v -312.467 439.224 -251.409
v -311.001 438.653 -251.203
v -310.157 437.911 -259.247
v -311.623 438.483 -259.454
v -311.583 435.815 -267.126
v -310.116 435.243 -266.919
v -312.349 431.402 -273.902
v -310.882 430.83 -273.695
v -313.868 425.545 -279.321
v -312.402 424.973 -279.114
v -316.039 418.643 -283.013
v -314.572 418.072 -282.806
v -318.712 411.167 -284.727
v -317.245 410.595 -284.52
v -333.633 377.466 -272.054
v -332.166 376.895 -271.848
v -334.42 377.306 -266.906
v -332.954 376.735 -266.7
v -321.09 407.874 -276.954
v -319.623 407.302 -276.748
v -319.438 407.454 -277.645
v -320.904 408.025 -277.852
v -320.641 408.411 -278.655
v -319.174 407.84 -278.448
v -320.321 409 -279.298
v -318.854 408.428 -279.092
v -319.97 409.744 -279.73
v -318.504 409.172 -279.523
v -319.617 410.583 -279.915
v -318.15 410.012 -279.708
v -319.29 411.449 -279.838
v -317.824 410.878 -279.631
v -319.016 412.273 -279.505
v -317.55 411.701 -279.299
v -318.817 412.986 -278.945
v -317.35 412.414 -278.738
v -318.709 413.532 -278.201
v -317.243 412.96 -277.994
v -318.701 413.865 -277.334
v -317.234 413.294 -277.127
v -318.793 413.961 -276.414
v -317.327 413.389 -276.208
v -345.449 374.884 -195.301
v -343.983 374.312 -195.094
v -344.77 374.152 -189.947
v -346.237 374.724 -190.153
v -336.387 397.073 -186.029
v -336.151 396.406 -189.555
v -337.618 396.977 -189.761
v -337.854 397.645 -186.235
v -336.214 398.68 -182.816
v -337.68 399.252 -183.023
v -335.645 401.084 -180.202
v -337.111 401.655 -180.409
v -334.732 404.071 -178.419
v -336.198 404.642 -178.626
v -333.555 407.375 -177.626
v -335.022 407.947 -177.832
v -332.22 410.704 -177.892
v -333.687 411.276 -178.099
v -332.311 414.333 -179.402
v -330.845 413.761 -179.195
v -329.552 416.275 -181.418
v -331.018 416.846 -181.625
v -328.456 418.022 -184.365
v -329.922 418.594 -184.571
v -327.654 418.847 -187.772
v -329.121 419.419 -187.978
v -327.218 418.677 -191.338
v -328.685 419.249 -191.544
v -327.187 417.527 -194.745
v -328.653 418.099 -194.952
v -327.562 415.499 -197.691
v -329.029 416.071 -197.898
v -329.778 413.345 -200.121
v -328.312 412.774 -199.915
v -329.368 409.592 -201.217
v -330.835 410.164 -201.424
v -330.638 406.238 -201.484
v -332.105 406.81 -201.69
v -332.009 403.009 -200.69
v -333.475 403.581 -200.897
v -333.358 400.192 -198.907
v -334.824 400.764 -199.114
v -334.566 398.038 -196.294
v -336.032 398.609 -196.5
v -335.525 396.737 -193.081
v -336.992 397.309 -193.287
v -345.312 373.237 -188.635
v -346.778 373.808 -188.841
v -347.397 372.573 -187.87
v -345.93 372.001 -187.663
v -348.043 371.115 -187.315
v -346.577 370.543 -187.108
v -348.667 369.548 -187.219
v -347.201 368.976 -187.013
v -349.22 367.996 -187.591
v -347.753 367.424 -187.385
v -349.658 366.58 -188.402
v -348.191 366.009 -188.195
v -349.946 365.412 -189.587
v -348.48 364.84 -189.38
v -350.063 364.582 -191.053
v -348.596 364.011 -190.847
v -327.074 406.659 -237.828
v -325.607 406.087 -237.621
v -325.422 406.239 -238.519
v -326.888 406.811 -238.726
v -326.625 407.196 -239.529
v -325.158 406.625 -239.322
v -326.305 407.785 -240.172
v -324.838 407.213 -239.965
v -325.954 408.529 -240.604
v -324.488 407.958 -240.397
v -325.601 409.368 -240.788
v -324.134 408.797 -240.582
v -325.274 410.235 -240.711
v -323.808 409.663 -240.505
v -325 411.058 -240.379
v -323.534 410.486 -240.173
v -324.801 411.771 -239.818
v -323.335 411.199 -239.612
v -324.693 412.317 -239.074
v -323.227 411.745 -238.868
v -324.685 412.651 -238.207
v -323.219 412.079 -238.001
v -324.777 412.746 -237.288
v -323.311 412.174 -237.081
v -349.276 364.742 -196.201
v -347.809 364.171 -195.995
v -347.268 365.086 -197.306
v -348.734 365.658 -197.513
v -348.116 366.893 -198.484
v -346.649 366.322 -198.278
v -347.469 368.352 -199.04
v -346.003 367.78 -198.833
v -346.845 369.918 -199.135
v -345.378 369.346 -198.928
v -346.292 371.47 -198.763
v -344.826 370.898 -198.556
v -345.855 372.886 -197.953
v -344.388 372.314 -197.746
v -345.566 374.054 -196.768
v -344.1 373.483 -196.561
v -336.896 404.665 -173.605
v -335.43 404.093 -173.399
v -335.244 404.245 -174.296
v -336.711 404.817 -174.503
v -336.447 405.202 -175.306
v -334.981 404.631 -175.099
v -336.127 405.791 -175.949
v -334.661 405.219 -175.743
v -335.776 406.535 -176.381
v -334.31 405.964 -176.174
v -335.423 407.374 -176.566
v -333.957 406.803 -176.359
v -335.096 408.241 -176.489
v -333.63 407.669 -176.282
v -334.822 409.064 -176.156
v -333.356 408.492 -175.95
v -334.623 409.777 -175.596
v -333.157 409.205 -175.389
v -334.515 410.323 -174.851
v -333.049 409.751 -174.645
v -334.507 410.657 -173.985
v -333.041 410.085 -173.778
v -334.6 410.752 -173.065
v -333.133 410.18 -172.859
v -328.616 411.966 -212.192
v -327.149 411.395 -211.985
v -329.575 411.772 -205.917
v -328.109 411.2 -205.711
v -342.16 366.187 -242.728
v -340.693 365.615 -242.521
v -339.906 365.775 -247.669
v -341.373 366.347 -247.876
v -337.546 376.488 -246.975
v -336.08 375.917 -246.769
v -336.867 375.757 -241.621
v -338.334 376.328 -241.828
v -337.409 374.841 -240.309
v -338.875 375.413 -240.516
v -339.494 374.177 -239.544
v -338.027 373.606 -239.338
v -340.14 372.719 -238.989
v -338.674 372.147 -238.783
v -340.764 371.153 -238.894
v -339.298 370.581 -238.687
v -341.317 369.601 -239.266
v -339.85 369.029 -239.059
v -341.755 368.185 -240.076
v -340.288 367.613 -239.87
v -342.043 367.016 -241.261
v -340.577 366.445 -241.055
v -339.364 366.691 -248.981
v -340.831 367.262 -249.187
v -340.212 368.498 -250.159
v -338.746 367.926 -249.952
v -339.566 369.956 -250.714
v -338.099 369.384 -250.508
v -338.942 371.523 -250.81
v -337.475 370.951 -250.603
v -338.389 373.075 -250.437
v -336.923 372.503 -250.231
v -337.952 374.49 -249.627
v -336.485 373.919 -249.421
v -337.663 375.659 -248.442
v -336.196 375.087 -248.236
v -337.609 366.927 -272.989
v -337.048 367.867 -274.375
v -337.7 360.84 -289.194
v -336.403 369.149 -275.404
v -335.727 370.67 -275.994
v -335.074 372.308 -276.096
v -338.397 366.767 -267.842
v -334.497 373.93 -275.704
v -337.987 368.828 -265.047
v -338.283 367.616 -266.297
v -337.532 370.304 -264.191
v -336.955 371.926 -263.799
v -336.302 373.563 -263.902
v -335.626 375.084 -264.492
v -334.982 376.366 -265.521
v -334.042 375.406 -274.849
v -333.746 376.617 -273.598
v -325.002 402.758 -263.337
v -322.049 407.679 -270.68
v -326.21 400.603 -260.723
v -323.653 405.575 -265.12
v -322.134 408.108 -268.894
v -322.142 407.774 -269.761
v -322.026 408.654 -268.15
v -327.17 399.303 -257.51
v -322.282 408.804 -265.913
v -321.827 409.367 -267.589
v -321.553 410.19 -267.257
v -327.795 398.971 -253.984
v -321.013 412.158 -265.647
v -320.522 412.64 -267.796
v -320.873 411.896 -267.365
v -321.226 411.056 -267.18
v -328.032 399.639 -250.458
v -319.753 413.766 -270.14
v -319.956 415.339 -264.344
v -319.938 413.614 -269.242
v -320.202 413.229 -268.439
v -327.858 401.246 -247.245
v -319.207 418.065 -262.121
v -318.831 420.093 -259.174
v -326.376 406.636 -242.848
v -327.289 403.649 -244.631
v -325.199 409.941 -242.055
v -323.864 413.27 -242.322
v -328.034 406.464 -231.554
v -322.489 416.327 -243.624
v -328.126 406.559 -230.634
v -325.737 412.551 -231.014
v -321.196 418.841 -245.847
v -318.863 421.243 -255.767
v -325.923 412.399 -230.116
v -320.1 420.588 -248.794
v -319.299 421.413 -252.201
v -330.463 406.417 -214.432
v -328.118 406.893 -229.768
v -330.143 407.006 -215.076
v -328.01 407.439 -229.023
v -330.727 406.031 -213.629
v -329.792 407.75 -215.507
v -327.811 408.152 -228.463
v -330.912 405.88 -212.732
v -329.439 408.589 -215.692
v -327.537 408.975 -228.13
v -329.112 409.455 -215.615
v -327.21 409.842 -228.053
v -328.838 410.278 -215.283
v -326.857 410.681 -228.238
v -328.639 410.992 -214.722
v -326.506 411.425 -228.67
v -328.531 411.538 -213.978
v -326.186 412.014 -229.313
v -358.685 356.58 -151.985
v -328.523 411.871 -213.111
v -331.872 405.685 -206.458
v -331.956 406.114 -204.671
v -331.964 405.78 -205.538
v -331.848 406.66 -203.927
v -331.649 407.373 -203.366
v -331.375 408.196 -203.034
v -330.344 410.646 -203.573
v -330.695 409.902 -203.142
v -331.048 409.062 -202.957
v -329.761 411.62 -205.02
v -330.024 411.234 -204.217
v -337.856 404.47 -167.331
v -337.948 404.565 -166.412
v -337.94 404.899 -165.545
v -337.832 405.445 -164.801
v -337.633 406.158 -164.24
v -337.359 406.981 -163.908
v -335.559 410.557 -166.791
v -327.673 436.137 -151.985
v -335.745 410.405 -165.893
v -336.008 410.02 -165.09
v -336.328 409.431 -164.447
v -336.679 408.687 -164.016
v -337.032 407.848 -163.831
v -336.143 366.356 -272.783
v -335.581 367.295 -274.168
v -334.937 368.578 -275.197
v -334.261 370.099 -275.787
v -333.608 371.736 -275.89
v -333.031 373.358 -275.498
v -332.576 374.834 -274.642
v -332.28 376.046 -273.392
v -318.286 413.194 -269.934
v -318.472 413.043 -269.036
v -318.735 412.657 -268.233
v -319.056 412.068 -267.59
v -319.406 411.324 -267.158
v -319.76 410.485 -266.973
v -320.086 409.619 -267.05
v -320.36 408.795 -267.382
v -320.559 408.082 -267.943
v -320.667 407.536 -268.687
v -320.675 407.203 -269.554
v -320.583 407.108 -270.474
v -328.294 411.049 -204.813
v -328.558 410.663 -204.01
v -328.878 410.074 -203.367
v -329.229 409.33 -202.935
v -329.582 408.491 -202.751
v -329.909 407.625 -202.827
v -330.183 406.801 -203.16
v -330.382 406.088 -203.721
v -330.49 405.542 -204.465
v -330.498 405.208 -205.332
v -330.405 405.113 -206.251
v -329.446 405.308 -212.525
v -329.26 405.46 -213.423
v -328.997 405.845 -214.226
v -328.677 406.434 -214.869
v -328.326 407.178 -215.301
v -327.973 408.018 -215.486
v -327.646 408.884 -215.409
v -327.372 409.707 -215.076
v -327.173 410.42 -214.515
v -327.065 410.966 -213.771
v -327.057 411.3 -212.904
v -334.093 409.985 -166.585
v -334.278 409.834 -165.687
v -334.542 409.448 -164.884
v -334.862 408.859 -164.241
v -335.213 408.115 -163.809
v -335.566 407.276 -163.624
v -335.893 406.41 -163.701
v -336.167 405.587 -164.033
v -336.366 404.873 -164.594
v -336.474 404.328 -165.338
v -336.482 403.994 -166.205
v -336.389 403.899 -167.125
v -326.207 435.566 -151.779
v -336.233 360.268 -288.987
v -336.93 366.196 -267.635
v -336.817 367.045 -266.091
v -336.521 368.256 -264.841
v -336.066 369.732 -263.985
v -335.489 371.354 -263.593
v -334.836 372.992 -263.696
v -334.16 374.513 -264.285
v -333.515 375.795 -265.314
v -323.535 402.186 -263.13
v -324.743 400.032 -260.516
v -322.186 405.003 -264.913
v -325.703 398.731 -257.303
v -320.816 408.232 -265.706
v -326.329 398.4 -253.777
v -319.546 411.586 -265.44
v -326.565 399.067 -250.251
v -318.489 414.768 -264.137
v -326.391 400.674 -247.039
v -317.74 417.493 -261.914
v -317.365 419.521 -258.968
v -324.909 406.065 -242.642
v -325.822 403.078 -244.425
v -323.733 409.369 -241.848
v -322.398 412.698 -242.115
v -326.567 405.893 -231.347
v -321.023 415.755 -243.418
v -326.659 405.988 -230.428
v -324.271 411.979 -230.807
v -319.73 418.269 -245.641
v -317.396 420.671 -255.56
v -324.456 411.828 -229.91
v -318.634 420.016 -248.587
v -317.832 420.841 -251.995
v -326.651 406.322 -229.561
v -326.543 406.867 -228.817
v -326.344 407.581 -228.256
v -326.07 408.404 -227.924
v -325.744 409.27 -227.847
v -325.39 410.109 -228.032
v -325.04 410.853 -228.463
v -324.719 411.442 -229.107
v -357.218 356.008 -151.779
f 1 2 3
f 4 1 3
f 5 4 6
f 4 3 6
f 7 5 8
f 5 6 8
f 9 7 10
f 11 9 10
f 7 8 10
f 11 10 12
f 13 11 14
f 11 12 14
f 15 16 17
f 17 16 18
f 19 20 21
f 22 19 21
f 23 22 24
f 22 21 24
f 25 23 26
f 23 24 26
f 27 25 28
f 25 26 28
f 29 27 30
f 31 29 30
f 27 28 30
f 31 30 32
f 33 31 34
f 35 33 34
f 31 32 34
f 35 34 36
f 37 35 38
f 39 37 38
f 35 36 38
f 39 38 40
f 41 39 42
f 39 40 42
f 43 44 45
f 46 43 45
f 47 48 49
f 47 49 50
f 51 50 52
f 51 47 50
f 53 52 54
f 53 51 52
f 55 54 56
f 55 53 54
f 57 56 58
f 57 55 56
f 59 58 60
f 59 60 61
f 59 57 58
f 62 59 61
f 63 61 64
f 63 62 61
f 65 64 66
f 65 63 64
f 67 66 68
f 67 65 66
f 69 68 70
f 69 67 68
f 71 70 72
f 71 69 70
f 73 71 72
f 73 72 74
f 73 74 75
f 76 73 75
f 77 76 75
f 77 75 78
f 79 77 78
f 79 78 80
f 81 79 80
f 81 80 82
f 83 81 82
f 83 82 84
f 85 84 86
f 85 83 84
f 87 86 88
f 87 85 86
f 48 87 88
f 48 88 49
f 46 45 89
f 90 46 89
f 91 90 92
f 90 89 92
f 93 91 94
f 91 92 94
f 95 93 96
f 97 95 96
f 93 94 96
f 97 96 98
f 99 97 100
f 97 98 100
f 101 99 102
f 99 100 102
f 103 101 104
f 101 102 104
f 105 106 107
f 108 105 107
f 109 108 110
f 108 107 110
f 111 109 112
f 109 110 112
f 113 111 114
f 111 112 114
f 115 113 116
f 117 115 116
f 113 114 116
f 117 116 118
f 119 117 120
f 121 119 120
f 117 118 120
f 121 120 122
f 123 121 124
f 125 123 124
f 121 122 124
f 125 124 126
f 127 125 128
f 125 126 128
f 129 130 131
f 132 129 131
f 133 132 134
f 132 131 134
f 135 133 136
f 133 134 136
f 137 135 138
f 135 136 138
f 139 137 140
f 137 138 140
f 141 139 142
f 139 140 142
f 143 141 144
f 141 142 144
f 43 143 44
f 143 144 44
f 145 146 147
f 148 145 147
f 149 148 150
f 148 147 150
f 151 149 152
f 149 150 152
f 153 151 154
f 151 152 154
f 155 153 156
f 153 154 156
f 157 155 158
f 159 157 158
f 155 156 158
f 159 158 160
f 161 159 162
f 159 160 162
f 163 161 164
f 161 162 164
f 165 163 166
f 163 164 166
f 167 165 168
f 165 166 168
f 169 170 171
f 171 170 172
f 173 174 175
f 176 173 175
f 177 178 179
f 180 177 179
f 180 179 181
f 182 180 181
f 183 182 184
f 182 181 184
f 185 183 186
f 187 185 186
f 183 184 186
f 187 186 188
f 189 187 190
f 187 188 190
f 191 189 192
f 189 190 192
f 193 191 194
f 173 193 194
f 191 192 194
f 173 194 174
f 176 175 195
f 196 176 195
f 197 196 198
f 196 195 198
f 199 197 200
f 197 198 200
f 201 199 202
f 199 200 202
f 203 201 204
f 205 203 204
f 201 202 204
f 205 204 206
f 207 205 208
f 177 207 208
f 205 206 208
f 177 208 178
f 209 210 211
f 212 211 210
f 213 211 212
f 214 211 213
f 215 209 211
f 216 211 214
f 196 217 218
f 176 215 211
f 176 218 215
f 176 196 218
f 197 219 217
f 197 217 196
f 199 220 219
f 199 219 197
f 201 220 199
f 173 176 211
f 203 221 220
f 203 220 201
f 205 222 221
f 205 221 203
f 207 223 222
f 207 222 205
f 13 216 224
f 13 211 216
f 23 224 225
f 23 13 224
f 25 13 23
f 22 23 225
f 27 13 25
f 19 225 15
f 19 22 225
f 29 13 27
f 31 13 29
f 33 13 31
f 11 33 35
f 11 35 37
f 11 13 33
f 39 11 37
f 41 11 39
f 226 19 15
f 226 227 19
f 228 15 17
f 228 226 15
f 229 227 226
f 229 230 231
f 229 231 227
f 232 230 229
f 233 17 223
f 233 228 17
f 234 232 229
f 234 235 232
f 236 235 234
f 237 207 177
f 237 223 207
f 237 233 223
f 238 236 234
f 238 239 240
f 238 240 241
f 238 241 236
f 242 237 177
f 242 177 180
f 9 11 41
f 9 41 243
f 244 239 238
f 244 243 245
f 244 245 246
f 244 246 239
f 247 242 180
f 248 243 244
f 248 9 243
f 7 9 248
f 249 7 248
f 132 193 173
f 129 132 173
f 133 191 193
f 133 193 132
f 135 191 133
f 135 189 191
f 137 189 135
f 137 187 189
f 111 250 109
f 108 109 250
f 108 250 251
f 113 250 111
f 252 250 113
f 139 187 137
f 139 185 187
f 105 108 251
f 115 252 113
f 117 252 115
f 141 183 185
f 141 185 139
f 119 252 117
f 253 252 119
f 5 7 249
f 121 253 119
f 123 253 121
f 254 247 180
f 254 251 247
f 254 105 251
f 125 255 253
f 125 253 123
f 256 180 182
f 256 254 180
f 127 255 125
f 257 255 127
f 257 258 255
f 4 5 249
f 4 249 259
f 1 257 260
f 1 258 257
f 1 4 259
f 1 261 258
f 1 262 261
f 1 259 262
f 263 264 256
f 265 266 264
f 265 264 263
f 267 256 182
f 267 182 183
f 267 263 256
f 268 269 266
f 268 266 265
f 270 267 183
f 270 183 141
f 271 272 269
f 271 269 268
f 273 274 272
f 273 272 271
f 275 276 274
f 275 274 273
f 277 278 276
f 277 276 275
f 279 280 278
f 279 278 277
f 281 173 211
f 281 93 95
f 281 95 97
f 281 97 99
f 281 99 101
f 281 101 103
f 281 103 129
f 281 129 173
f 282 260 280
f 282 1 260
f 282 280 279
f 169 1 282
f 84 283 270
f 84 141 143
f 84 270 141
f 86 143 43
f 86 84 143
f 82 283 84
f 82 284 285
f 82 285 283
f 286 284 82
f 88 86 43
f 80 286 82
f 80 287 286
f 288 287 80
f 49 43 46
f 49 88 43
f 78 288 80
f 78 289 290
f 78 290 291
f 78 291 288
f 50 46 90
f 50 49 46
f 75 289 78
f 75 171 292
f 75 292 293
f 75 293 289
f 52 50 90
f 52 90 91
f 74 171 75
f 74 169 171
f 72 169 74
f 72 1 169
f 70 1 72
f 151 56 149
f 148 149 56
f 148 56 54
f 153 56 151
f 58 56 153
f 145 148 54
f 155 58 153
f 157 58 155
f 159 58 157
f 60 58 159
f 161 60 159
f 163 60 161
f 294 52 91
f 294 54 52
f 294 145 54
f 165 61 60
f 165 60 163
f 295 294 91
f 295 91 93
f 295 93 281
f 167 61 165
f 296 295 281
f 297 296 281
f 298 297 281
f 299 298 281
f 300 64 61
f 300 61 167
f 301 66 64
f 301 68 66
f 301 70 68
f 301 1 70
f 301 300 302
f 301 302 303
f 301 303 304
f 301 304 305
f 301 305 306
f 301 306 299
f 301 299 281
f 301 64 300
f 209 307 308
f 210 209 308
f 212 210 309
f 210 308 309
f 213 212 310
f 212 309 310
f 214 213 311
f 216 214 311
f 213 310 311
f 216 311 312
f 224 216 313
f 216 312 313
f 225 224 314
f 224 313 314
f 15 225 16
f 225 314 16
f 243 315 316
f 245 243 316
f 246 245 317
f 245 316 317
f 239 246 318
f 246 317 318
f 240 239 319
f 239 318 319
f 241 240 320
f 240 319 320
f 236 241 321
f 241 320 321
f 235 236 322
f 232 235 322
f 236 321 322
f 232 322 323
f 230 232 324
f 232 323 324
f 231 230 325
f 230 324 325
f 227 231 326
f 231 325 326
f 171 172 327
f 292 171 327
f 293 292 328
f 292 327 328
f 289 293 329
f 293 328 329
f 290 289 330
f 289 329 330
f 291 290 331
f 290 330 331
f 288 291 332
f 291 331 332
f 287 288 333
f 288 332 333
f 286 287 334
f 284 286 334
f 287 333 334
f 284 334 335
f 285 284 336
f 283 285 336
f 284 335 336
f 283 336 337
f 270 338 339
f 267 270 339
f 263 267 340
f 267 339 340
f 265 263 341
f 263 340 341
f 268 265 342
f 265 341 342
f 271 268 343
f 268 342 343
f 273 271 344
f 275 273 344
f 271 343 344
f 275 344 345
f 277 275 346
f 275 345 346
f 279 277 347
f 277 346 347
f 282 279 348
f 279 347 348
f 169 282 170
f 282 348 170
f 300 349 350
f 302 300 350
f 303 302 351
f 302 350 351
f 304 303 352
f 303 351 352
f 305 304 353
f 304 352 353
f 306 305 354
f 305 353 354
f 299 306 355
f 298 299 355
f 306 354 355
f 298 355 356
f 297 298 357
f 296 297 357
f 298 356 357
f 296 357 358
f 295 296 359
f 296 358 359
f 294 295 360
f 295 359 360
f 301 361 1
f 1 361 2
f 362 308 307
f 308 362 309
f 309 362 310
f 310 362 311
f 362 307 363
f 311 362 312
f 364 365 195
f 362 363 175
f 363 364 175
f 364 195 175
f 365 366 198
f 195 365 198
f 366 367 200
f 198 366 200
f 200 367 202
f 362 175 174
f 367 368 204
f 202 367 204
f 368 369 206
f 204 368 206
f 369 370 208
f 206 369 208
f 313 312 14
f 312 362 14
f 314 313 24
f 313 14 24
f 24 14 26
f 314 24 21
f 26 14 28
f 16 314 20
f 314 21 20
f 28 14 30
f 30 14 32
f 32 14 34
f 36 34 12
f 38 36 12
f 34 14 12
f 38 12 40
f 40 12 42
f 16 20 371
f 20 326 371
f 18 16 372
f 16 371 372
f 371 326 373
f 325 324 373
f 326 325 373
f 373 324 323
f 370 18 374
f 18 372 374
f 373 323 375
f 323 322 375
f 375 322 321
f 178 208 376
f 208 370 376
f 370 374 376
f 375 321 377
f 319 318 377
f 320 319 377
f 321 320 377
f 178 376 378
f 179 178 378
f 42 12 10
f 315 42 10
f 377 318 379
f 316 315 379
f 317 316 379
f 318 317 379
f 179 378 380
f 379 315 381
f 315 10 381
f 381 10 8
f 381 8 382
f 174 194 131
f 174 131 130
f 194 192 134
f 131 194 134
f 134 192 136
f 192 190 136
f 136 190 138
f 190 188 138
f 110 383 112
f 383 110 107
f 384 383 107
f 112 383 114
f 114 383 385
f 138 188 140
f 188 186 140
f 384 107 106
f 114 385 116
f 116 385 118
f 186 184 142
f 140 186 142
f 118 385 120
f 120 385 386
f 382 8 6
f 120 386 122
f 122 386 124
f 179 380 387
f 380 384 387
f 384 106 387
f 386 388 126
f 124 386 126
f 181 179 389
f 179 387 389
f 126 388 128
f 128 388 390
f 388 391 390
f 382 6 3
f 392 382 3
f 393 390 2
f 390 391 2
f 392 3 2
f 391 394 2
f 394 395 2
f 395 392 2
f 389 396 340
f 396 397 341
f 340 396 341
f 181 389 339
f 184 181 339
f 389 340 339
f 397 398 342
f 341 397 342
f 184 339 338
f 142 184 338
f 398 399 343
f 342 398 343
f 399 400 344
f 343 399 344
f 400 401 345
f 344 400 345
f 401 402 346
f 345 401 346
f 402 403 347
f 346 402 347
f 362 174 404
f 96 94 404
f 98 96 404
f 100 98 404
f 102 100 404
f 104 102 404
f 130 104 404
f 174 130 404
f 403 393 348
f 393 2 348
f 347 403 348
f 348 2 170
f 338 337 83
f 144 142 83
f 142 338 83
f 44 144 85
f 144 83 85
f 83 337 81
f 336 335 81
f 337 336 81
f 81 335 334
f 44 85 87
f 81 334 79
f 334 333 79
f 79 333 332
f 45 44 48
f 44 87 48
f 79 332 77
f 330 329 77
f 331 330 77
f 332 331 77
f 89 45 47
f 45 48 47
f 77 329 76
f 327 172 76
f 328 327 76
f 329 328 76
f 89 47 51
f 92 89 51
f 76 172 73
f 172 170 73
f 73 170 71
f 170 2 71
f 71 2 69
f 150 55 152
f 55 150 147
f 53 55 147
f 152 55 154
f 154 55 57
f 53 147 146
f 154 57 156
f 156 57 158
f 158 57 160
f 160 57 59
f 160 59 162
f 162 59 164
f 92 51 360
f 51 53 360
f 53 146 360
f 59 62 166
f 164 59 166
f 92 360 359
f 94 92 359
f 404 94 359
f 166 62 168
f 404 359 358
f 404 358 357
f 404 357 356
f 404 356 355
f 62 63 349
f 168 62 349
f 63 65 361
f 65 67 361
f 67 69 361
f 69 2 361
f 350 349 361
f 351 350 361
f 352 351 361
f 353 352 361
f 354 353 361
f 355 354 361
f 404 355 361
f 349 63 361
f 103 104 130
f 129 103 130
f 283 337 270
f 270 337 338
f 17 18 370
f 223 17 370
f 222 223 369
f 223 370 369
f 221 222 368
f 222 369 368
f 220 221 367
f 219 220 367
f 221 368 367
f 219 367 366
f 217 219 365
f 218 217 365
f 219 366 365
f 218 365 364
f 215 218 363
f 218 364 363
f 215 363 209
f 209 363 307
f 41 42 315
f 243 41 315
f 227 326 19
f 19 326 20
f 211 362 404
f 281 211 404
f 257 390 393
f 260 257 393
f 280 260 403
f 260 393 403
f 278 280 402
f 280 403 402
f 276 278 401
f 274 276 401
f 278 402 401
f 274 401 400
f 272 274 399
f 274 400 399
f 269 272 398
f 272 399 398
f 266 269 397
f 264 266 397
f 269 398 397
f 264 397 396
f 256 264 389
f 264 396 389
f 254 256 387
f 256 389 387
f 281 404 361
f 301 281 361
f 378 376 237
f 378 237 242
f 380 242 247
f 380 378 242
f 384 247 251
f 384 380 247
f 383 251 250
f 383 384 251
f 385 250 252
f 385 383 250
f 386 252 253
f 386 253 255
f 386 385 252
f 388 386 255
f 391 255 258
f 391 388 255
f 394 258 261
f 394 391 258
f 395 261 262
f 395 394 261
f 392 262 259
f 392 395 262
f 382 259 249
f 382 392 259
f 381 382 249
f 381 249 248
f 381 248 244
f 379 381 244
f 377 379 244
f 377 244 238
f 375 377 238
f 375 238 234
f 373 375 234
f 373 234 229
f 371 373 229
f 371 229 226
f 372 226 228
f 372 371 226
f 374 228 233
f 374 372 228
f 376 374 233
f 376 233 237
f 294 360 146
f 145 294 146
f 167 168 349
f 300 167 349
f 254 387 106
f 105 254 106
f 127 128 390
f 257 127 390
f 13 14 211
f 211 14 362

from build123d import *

# Parameters (mm, degrees)
SKETCH39_R          = 12.065
BOSS_EXTRUDE1_DEPTH = 1.5875


with BuildPart() as part:
    # Sketch39 → Boss-Extrude1 (new body)
    with BuildSketch(Plane(origin=(-441.521969452, 172.104793819, -62.182961286), x_dir=(-0.1212218165913434, 0.04725213510134498, 0.9915001295565519), z_dir=(-0.9237984742451071, 0.36009566214142513, -0.1301056996804562))):
        with BuildLine():
            Line((-228.748442373, 213.554448141), (-90.363815922, 201.963804234))
            Line((-90.363815922, 201.963804234), (-90.363815922, 287.351743879))
            Line((-90.363815922, 287.351743879), (-190.640017459, 295.750550698))
            ThreePointArc((-190.640017459, 295.750550698), (-213.325518758, 288.505331466), (-224.243446911, 267.341116014))
            Line((-224.243446911, 267.341116014), (-228.748442373, 213.554448141))
        make_face()
        with Locations((-128.463815922, 259.318927244)):
            Circle(SKETCH39_R, mode=Mode.SUBTRACT)
        with Locations((-193.237014843, 264.74411863)):
            Circle(SKETCH39_R, mode=Mode.SUBTRACT)
        with BuildLine():
            Line((-211.461957069, 230.522345777), (-206.270039744, 230.087487755))
            ThreePointArc((-206.270039744, 230.087487755), (-203.136411518, 224.15373677), (-207.213438794, 218.823926718))
            Line((-207.213438794, 218.823926718), (-212.405356118, 219.25878474))
            ThreePointArc((-212.405356118, 219.25878474), (-215.538984345, 225.192535724), (-211.461957069, 230.522345777))
        make_face(mode=Mode.SUBTRACT)
        with BuildLine():
            Line((-186.168382291, 228.189847508), (-180.976464967, 227.754989487))
            ThreePointArc((-180.976464967, 227.754989487), (-178.017364976, 222.049847551), (-181.884267338, 216.916429257))
            Line((-181.884267338, 216.916429257), (-187.076184662, 217.351287279))
            ThreePointArc((-187.076184662, 217.351287279), (-190.035284653, 223.056429214), (-186.168382291, 228.189847508))
        make_face(mode=Mode.SUBTRACT)
        with BuildLine():
            Line((-215.859429659, 269.914226569), (-209.53158638, 269.384227103))
            ThreePointArc((-209.53158638, 269.384227103), (-206.55149466, 265.859295931), (-210.076425831, 262.879204212))
            Line((-210.076425831, 262.879204212), (-216.40426911, 263.409203678))
            ThreePointArc((-216.40426911, 263.409203678), (-219.38436083, 266.934134849), (-215.859429659, 269.914226569))
        make_face(mode=Mode.SUBTRACT)
        with BuildLine():
            Line((-170.614600027, 259.57401069), (-176.942443306, 260.104010157))
            ThreePointArc((-176.942443306, 260.104010157), (-179.922535026, 263.628941328), (-176.397603855, 266.609033048))
            Line((-176.397603855, 266.609033048), (-170.069760576, 266.079033581))
            ThreePointArc((-170.069760576, 266.079033581), (-167.089668856, 262.55410241), (-170.614600027, 259.57401069))
        make_face(mode=Mode.SUBTRACT)
        with BuildLine():
            Line((-151.086230738, 264.489035183), (-144.758387459, 263.959035717))
            ThreePointArc((-144.758387459, 263.959035717), (-141.778295739, 260.434104546), (-145.30322691, 257.454012826))
            Line((-145.30322691, 257.454012826), (-151.631070189, 257.984012292))
            ThreePointArc((-151.631070189, 257.984012292), (-154.611161909, 261.508943463), (-151.086230738, 264.489035183))
        make_face(mode=Mode.SUBTRACT)
        with BuildLine():
            Line((-105.841401106, 254.148819304), (-112.169244385, 254.678818771))
            ThreePointArc((-112.169244385, 254.678818771), (-115.149336105, 258.203749942), (-111.624404934, 261.183841662))
            Line((-111.624404934, 261.183841662), (-105.296561655, 260.653842195))
            ThreePointArc((-105.296561655, 260.653842195), (-102.316469935, 257.128911024), (-105.841401106, 254.148819304))
        make_face(mode=Mode.SUBTRACT)
        with BuildLine():
            Line((-134.050869929, 223.824655055), (-128.858952604, 223.389797033))
            ThreePointArc((-128.858952604, 223.389797033), (-125.899852614, 217.684655097), (-129.766754976, 212.551236803))
            Line((-129.766754976, 212.551236803), (-134.9586723, 212.986094825))
            ThreePointArc((-134.9586723, 212.986094825), (-137.917772291, 218.691236761), (-134.050869929, 223.824655055))
        make_face(mode=Mode.SUBTRACT)
    extrude(amount=BOSS_EXTRUDE1_DEPTH)


solid = part.part
